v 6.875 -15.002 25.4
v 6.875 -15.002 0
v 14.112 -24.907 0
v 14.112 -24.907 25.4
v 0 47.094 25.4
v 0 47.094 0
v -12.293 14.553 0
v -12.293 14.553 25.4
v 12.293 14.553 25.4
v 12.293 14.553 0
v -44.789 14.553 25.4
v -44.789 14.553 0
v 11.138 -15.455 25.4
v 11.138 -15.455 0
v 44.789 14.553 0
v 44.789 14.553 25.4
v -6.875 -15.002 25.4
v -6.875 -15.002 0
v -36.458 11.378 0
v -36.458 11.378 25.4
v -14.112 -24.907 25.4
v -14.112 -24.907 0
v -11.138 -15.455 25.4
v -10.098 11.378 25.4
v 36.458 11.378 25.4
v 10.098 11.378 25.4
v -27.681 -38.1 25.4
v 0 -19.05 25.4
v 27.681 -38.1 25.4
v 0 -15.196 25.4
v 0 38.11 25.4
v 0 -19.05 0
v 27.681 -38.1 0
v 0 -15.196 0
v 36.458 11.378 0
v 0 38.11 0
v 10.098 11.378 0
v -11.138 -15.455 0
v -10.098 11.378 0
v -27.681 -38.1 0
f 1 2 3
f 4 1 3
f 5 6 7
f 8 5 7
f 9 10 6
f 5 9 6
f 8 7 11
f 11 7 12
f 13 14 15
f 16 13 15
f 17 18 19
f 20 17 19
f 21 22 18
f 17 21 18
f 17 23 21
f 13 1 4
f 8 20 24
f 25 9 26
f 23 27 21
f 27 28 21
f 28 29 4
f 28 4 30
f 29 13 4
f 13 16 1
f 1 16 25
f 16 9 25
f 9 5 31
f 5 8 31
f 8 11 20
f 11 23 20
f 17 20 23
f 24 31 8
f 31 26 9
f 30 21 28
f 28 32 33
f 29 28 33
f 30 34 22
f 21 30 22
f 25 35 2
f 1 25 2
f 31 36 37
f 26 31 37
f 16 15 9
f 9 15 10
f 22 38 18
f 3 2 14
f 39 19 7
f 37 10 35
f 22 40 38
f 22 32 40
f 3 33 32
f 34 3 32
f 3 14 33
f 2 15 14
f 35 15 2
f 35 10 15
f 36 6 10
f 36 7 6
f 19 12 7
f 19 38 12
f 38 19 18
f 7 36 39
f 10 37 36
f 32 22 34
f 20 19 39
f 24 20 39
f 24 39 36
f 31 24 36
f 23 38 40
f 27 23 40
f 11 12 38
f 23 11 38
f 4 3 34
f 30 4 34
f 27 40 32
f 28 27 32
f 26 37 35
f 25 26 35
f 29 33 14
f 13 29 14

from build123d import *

# Parameters (mm, degrees)
F1_DEPTH = 25.4


with BuildPart() as f1:
    # F0 (on Top) → F1 (new body)
    with BuildSketch(Plane.XY):
        Polygon((-11.13816, -15.454575), (-27.68127, -38.1), (0, -19.05), (27.68127, -38.1), (11.13816, -15.454575), (44.789236, 14.552905), (12.292903, 14.552905), (0, 47.09419), (-12.292903, 14.552905), (-44.789236, 14.552905), align=None)
        Polygon((-36.458193, 11.377905), (-10.098309, 11.377905), (0, 38.109749), (10.098309, 11.377905), (36.458193, 11.377905), (6.875413, -15.001777), (14.111704, -24.907345), (0, -15.195797), (-14.111704, -24.907345), (-6.875413, -15.001777), align=None, mode=Mode.SUBTRACT)
    extrude(amount=F1_DEPTH)


solid = f1.part
